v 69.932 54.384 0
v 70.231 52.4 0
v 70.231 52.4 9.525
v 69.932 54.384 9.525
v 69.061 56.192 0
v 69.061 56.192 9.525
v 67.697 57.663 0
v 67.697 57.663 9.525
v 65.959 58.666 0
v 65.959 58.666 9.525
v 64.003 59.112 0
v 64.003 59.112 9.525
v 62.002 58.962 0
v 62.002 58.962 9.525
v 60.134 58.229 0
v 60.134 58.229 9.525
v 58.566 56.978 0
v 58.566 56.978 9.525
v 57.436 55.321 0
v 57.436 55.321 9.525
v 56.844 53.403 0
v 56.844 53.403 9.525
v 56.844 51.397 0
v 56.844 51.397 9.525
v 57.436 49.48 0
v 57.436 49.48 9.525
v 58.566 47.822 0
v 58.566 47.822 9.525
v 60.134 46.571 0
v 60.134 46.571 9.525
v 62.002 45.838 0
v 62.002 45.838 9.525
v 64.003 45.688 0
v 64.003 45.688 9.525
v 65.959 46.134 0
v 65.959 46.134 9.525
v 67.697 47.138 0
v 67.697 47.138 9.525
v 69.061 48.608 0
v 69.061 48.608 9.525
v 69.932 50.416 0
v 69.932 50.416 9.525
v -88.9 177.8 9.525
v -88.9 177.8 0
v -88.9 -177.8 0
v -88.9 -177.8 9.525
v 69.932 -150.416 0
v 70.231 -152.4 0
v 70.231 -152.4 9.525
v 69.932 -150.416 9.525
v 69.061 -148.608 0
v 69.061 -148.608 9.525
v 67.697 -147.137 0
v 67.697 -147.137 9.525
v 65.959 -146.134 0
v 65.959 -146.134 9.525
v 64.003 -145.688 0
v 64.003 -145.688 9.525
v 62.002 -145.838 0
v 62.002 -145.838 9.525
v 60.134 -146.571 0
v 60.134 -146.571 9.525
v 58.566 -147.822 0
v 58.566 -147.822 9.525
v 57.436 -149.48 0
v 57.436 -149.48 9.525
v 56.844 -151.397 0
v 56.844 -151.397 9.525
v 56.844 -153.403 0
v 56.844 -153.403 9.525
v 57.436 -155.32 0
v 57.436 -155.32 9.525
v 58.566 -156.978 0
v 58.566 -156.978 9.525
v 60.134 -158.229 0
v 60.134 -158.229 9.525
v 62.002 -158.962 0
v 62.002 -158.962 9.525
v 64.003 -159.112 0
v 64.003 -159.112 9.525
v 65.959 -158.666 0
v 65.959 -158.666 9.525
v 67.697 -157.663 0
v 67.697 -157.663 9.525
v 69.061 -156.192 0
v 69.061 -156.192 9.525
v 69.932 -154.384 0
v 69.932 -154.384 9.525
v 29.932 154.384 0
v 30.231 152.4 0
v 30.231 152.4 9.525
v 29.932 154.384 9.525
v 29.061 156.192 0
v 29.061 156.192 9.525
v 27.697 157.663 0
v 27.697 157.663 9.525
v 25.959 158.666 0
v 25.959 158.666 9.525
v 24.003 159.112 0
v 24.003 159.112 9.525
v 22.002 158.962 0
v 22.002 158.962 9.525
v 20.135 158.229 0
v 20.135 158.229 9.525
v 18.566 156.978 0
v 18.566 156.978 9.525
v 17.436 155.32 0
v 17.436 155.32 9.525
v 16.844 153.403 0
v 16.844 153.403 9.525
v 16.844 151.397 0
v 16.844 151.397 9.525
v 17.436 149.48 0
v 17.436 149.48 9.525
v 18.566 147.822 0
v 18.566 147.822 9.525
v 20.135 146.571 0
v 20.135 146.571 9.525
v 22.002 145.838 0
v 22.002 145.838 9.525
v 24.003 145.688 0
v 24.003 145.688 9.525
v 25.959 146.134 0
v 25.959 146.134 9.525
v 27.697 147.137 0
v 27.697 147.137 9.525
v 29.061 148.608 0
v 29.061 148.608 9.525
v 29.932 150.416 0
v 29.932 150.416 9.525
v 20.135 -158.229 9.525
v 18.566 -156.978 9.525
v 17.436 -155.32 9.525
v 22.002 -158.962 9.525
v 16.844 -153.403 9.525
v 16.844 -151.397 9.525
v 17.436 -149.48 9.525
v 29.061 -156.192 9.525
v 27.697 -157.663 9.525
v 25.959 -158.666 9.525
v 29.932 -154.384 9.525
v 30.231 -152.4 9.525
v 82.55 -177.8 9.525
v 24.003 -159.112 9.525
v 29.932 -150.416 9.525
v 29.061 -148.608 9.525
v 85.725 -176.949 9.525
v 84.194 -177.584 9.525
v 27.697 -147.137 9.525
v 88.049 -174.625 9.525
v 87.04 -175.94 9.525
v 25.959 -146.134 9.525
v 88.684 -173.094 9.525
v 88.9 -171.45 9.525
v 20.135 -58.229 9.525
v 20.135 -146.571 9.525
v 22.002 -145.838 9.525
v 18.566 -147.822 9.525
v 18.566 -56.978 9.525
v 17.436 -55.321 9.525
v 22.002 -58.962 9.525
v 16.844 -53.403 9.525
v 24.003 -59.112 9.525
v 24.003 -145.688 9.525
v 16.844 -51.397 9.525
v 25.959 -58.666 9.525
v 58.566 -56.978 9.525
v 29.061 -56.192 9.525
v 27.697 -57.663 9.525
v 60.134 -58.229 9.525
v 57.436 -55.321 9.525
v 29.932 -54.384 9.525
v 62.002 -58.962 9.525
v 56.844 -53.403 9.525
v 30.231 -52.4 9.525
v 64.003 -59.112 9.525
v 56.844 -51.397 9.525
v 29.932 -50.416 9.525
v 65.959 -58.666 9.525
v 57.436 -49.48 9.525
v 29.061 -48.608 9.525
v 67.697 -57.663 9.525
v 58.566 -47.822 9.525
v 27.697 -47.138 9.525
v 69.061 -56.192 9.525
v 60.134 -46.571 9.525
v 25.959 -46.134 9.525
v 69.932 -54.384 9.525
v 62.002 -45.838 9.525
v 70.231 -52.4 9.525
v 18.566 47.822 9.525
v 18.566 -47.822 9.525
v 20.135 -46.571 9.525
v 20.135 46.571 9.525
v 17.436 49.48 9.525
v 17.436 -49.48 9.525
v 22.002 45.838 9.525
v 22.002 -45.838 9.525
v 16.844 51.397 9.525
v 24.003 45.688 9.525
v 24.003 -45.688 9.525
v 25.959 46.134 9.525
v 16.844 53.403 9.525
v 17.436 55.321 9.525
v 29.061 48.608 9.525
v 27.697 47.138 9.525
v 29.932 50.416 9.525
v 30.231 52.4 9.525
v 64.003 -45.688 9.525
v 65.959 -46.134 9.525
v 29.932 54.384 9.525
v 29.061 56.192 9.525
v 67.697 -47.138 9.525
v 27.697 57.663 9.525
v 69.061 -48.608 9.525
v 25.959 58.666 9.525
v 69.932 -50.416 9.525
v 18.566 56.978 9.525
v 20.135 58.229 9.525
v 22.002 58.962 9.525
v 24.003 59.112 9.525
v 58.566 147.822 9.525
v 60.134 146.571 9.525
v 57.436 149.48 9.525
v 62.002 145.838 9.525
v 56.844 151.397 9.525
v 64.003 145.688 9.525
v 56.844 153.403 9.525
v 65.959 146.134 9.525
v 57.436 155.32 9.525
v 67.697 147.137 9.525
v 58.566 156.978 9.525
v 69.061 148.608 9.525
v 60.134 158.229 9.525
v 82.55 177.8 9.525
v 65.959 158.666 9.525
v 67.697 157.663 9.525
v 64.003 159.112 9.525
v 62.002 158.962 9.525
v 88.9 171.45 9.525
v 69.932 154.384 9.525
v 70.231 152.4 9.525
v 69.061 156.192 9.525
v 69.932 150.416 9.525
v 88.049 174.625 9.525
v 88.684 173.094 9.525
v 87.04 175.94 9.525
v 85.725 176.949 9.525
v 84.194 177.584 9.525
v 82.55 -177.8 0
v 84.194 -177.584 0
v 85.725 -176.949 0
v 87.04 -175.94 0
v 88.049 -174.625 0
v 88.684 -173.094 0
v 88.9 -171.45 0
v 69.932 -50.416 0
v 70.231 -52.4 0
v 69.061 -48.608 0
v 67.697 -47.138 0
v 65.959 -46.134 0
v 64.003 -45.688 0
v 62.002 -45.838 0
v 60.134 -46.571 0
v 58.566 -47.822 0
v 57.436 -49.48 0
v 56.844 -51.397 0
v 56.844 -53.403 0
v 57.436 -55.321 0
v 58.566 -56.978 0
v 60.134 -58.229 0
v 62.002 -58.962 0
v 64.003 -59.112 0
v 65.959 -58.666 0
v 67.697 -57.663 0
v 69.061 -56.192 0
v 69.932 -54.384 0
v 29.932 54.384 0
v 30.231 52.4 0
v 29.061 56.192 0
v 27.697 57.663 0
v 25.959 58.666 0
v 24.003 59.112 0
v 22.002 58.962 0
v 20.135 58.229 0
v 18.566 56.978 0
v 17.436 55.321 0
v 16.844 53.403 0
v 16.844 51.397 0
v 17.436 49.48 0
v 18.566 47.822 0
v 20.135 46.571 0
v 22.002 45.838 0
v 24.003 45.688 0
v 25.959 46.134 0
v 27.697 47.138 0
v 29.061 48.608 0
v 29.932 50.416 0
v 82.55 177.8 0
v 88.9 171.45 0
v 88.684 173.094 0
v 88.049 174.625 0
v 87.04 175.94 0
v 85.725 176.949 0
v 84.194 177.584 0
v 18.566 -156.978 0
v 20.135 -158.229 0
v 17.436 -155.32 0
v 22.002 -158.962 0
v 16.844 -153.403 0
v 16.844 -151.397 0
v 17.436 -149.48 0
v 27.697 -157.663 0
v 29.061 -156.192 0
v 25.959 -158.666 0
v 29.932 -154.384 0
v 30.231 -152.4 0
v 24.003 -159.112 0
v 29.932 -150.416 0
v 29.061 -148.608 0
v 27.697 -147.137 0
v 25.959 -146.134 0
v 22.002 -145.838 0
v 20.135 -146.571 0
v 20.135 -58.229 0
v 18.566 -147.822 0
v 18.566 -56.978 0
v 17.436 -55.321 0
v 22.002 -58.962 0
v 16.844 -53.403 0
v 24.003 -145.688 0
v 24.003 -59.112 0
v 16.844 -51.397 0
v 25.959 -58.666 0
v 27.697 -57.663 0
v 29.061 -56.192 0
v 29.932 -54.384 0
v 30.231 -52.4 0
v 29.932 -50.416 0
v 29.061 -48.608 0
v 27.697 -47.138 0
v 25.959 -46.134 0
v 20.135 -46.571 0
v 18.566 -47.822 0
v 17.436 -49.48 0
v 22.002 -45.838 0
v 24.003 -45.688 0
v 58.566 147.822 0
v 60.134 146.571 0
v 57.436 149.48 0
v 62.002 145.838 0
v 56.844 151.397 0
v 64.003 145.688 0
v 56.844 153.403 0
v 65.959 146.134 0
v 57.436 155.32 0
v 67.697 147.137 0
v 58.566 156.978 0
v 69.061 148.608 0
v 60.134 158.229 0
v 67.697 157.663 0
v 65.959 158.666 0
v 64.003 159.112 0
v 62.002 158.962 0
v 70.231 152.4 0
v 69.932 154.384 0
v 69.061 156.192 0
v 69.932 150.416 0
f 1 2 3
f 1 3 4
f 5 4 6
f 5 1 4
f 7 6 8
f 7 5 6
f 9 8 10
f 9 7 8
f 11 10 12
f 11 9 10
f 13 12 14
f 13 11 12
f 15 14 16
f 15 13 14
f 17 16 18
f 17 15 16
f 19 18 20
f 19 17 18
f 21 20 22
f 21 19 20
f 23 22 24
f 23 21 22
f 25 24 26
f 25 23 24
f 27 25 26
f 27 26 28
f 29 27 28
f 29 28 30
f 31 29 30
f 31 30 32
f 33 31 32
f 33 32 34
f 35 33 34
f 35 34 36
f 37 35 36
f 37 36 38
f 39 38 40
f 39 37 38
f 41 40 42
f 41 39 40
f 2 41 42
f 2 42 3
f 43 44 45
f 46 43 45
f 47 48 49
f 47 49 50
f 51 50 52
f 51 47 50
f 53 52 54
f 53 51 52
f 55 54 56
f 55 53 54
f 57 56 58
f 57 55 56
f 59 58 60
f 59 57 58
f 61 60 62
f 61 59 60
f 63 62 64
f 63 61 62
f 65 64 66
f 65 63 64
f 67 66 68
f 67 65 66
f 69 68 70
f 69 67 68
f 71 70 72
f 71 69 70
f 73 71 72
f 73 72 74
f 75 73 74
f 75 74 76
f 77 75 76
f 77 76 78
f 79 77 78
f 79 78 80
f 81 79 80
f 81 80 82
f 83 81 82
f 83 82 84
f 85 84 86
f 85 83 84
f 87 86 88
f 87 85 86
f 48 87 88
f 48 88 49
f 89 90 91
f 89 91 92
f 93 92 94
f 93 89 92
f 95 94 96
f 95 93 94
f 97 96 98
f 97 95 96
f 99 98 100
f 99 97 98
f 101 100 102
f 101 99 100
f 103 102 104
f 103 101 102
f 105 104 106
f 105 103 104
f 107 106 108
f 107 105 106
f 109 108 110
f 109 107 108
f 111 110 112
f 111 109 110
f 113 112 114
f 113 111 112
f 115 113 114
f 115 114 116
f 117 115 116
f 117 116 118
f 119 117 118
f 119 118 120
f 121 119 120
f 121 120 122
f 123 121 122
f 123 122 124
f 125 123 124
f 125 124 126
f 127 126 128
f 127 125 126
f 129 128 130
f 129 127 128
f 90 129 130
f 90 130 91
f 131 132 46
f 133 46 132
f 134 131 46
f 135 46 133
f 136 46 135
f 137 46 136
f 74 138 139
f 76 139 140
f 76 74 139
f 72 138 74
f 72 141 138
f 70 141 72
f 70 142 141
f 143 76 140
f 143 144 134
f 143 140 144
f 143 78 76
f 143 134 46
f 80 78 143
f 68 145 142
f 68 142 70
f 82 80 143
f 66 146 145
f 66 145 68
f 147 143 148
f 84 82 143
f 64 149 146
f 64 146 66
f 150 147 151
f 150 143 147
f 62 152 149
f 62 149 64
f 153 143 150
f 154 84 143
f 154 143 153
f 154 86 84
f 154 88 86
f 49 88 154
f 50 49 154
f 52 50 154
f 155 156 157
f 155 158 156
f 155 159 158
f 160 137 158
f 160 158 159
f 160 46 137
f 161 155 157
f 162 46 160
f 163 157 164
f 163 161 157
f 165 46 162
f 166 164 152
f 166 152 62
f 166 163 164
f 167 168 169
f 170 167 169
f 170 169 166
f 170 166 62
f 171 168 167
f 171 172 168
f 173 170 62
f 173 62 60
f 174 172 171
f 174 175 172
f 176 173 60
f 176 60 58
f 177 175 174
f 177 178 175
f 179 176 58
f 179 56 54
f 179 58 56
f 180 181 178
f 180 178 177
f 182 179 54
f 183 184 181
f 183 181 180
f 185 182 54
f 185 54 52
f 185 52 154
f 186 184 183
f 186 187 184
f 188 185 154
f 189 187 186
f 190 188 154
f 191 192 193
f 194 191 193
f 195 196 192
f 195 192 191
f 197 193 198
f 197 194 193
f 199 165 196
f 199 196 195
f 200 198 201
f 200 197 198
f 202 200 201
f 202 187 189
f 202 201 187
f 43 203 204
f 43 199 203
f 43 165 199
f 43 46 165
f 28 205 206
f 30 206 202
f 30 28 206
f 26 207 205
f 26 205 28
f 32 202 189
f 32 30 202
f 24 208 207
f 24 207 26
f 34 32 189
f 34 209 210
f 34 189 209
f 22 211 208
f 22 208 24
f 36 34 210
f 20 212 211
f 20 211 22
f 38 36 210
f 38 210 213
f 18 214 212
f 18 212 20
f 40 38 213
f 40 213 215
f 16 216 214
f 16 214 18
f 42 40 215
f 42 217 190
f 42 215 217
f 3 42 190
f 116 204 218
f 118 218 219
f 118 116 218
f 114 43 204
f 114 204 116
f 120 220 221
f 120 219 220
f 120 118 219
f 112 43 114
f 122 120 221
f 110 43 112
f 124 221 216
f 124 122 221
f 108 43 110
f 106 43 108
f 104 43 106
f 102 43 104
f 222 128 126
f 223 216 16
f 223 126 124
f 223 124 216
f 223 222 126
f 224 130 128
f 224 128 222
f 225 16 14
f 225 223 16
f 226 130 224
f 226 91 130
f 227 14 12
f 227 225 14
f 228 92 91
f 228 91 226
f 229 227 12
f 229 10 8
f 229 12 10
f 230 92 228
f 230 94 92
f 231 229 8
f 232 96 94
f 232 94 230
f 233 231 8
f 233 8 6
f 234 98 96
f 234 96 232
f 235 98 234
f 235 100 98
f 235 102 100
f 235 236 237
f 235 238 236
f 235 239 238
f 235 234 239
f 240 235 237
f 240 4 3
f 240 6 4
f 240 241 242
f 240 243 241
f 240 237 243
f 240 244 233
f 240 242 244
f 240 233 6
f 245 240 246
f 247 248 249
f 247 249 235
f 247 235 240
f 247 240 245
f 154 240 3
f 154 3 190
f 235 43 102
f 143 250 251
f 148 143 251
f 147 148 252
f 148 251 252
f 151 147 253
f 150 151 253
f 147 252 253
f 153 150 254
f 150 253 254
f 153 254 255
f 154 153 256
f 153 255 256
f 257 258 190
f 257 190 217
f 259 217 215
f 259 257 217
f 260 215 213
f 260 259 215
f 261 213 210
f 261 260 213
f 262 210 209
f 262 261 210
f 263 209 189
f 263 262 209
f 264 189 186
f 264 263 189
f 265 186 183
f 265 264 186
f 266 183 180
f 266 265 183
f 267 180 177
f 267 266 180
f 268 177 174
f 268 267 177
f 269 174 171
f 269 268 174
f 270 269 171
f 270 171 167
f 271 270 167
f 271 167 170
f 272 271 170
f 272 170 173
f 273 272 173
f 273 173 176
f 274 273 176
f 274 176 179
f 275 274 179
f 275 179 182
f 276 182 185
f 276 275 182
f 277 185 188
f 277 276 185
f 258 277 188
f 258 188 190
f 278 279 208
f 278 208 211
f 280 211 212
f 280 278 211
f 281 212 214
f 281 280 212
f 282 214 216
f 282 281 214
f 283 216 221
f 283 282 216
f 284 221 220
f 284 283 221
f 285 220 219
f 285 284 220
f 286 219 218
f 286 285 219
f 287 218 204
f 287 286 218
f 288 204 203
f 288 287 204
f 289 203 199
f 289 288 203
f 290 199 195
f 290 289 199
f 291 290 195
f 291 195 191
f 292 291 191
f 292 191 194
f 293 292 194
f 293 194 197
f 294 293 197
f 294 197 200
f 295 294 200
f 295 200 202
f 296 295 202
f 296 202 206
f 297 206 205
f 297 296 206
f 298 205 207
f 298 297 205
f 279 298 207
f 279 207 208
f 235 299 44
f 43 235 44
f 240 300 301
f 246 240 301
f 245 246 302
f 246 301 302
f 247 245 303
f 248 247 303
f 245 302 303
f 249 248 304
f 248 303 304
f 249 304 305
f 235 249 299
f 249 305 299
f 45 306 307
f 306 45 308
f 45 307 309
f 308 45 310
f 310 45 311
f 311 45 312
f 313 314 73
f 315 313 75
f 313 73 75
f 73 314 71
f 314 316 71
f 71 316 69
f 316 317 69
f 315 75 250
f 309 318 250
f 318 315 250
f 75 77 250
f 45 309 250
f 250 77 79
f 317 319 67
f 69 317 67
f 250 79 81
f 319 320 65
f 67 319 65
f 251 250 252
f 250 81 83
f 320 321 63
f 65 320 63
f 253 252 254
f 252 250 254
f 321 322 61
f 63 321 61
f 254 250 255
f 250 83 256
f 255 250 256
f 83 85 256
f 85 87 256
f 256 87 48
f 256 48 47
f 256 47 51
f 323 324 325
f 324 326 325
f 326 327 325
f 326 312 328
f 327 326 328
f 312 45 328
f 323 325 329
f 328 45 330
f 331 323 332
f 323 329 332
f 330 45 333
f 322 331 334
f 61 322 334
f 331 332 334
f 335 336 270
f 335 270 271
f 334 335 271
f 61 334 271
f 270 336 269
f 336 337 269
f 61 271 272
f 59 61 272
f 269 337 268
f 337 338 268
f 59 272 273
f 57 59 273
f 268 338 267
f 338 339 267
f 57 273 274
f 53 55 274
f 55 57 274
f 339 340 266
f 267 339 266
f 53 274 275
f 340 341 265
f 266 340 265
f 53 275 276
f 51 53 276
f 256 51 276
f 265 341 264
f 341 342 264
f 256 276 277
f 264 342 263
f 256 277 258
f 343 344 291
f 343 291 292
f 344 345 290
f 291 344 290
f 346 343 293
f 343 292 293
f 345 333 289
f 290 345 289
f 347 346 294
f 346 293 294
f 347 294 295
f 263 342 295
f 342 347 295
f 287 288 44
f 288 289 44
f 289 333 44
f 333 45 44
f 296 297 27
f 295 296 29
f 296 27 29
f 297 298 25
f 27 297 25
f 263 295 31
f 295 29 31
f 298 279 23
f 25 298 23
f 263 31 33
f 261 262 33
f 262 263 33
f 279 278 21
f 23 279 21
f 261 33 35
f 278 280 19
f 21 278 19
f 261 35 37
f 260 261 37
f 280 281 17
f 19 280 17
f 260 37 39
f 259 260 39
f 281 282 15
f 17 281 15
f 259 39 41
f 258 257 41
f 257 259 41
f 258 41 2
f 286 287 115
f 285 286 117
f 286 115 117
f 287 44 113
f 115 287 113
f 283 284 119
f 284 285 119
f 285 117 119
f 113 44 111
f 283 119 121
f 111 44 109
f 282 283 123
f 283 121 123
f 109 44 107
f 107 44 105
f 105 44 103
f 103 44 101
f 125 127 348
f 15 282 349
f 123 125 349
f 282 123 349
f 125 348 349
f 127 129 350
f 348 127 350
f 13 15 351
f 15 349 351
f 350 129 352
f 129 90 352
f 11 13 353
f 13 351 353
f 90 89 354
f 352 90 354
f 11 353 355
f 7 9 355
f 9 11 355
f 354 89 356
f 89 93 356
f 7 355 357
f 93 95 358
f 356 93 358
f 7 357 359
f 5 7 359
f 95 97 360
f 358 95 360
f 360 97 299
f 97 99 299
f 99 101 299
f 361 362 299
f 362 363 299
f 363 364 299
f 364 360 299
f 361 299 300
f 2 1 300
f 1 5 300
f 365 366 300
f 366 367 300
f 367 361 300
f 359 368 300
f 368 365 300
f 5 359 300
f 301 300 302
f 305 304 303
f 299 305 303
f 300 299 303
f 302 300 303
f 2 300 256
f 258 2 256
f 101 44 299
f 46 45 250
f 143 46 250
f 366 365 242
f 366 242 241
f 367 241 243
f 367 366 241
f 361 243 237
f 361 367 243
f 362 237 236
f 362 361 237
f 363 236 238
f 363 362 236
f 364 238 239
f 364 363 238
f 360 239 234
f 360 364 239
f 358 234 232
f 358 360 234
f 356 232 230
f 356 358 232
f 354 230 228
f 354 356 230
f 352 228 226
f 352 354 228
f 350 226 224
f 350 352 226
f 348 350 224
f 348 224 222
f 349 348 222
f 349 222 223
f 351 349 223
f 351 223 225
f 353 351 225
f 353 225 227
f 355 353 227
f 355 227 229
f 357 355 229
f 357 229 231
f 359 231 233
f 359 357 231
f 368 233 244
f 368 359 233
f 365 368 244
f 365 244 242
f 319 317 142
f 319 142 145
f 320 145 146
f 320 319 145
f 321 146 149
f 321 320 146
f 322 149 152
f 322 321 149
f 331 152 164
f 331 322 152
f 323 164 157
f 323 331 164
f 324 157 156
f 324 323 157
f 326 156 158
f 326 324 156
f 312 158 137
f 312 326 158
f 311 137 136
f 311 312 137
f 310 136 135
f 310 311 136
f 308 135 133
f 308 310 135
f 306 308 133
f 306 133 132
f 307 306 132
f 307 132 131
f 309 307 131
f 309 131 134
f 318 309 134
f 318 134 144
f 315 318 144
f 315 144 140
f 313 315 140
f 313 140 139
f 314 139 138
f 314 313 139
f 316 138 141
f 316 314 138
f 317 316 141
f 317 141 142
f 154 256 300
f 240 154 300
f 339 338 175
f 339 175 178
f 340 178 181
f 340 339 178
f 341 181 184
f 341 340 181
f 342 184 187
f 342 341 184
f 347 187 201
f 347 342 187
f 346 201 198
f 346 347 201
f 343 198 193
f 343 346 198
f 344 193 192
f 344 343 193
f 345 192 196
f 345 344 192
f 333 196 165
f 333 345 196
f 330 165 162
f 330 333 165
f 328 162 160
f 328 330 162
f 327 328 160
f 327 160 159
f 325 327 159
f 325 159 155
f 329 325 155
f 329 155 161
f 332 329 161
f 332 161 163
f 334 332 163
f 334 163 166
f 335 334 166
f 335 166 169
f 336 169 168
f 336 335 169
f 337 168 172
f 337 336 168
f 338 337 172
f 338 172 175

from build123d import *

# Parameters (mm, degrees)
F0_R     = 6.731
F1_DEPTH = 9.525


with BuildPart() as f1:
    # F0 (on Top) → F1 (new body)
    with BuildSketch(Plane.XY):
        with BuildLine():
            Line((-88.9, 177.8), (-88.9, -177.8))
            Line((-88.9, -177.8), (82.55, -177.8))
            ThreePointArc((82.55, -177.8), (87.040128, -175.940128), (88.9, -171.45))
            Line((88.9, -171.45), (88.9, 171.45))
            ThreePointArc((88.9, 171.45), (87.040128, 175.940128), (82.55, 177.8))
            Line((82.55, 177.8), (-88.9, 177.8))
        make_face()
        with Locations((23.50008, -152.4)):
            Circle(F0_R, mode=Mode.SUBTRACT)
        with Locations((63.5, -152.4)):
            Circle(F0_R, mode=Mode.SUBTRACT)
        with Locations((23.50008, -52.4002)):
            Circle(F0_R, mode=Mode.SUBTRACT)
        with Locations((63.5, -52.4002)):
            Circle(F0_R, mode=Mode.SUBTRACT)
        with Locations((23.50008, 52.4002)):
            Circle(F0_R, mode=Mode.SUBTRACT)
        with Locations((63.5, 52.4002)):
            Circle(F0_R, mode=Mode.SUBTRACT)
        with Locations((23.50008, 152.4)):
            Circle(F0_R, mode=Mode.SUBTRACT)
        with Locations((63.5, 152.4)):
            Circle(F0_R, mode=Mode.SUBTRACT)
    extrude(amount=F1_DEPTH)


solid = f1.part
